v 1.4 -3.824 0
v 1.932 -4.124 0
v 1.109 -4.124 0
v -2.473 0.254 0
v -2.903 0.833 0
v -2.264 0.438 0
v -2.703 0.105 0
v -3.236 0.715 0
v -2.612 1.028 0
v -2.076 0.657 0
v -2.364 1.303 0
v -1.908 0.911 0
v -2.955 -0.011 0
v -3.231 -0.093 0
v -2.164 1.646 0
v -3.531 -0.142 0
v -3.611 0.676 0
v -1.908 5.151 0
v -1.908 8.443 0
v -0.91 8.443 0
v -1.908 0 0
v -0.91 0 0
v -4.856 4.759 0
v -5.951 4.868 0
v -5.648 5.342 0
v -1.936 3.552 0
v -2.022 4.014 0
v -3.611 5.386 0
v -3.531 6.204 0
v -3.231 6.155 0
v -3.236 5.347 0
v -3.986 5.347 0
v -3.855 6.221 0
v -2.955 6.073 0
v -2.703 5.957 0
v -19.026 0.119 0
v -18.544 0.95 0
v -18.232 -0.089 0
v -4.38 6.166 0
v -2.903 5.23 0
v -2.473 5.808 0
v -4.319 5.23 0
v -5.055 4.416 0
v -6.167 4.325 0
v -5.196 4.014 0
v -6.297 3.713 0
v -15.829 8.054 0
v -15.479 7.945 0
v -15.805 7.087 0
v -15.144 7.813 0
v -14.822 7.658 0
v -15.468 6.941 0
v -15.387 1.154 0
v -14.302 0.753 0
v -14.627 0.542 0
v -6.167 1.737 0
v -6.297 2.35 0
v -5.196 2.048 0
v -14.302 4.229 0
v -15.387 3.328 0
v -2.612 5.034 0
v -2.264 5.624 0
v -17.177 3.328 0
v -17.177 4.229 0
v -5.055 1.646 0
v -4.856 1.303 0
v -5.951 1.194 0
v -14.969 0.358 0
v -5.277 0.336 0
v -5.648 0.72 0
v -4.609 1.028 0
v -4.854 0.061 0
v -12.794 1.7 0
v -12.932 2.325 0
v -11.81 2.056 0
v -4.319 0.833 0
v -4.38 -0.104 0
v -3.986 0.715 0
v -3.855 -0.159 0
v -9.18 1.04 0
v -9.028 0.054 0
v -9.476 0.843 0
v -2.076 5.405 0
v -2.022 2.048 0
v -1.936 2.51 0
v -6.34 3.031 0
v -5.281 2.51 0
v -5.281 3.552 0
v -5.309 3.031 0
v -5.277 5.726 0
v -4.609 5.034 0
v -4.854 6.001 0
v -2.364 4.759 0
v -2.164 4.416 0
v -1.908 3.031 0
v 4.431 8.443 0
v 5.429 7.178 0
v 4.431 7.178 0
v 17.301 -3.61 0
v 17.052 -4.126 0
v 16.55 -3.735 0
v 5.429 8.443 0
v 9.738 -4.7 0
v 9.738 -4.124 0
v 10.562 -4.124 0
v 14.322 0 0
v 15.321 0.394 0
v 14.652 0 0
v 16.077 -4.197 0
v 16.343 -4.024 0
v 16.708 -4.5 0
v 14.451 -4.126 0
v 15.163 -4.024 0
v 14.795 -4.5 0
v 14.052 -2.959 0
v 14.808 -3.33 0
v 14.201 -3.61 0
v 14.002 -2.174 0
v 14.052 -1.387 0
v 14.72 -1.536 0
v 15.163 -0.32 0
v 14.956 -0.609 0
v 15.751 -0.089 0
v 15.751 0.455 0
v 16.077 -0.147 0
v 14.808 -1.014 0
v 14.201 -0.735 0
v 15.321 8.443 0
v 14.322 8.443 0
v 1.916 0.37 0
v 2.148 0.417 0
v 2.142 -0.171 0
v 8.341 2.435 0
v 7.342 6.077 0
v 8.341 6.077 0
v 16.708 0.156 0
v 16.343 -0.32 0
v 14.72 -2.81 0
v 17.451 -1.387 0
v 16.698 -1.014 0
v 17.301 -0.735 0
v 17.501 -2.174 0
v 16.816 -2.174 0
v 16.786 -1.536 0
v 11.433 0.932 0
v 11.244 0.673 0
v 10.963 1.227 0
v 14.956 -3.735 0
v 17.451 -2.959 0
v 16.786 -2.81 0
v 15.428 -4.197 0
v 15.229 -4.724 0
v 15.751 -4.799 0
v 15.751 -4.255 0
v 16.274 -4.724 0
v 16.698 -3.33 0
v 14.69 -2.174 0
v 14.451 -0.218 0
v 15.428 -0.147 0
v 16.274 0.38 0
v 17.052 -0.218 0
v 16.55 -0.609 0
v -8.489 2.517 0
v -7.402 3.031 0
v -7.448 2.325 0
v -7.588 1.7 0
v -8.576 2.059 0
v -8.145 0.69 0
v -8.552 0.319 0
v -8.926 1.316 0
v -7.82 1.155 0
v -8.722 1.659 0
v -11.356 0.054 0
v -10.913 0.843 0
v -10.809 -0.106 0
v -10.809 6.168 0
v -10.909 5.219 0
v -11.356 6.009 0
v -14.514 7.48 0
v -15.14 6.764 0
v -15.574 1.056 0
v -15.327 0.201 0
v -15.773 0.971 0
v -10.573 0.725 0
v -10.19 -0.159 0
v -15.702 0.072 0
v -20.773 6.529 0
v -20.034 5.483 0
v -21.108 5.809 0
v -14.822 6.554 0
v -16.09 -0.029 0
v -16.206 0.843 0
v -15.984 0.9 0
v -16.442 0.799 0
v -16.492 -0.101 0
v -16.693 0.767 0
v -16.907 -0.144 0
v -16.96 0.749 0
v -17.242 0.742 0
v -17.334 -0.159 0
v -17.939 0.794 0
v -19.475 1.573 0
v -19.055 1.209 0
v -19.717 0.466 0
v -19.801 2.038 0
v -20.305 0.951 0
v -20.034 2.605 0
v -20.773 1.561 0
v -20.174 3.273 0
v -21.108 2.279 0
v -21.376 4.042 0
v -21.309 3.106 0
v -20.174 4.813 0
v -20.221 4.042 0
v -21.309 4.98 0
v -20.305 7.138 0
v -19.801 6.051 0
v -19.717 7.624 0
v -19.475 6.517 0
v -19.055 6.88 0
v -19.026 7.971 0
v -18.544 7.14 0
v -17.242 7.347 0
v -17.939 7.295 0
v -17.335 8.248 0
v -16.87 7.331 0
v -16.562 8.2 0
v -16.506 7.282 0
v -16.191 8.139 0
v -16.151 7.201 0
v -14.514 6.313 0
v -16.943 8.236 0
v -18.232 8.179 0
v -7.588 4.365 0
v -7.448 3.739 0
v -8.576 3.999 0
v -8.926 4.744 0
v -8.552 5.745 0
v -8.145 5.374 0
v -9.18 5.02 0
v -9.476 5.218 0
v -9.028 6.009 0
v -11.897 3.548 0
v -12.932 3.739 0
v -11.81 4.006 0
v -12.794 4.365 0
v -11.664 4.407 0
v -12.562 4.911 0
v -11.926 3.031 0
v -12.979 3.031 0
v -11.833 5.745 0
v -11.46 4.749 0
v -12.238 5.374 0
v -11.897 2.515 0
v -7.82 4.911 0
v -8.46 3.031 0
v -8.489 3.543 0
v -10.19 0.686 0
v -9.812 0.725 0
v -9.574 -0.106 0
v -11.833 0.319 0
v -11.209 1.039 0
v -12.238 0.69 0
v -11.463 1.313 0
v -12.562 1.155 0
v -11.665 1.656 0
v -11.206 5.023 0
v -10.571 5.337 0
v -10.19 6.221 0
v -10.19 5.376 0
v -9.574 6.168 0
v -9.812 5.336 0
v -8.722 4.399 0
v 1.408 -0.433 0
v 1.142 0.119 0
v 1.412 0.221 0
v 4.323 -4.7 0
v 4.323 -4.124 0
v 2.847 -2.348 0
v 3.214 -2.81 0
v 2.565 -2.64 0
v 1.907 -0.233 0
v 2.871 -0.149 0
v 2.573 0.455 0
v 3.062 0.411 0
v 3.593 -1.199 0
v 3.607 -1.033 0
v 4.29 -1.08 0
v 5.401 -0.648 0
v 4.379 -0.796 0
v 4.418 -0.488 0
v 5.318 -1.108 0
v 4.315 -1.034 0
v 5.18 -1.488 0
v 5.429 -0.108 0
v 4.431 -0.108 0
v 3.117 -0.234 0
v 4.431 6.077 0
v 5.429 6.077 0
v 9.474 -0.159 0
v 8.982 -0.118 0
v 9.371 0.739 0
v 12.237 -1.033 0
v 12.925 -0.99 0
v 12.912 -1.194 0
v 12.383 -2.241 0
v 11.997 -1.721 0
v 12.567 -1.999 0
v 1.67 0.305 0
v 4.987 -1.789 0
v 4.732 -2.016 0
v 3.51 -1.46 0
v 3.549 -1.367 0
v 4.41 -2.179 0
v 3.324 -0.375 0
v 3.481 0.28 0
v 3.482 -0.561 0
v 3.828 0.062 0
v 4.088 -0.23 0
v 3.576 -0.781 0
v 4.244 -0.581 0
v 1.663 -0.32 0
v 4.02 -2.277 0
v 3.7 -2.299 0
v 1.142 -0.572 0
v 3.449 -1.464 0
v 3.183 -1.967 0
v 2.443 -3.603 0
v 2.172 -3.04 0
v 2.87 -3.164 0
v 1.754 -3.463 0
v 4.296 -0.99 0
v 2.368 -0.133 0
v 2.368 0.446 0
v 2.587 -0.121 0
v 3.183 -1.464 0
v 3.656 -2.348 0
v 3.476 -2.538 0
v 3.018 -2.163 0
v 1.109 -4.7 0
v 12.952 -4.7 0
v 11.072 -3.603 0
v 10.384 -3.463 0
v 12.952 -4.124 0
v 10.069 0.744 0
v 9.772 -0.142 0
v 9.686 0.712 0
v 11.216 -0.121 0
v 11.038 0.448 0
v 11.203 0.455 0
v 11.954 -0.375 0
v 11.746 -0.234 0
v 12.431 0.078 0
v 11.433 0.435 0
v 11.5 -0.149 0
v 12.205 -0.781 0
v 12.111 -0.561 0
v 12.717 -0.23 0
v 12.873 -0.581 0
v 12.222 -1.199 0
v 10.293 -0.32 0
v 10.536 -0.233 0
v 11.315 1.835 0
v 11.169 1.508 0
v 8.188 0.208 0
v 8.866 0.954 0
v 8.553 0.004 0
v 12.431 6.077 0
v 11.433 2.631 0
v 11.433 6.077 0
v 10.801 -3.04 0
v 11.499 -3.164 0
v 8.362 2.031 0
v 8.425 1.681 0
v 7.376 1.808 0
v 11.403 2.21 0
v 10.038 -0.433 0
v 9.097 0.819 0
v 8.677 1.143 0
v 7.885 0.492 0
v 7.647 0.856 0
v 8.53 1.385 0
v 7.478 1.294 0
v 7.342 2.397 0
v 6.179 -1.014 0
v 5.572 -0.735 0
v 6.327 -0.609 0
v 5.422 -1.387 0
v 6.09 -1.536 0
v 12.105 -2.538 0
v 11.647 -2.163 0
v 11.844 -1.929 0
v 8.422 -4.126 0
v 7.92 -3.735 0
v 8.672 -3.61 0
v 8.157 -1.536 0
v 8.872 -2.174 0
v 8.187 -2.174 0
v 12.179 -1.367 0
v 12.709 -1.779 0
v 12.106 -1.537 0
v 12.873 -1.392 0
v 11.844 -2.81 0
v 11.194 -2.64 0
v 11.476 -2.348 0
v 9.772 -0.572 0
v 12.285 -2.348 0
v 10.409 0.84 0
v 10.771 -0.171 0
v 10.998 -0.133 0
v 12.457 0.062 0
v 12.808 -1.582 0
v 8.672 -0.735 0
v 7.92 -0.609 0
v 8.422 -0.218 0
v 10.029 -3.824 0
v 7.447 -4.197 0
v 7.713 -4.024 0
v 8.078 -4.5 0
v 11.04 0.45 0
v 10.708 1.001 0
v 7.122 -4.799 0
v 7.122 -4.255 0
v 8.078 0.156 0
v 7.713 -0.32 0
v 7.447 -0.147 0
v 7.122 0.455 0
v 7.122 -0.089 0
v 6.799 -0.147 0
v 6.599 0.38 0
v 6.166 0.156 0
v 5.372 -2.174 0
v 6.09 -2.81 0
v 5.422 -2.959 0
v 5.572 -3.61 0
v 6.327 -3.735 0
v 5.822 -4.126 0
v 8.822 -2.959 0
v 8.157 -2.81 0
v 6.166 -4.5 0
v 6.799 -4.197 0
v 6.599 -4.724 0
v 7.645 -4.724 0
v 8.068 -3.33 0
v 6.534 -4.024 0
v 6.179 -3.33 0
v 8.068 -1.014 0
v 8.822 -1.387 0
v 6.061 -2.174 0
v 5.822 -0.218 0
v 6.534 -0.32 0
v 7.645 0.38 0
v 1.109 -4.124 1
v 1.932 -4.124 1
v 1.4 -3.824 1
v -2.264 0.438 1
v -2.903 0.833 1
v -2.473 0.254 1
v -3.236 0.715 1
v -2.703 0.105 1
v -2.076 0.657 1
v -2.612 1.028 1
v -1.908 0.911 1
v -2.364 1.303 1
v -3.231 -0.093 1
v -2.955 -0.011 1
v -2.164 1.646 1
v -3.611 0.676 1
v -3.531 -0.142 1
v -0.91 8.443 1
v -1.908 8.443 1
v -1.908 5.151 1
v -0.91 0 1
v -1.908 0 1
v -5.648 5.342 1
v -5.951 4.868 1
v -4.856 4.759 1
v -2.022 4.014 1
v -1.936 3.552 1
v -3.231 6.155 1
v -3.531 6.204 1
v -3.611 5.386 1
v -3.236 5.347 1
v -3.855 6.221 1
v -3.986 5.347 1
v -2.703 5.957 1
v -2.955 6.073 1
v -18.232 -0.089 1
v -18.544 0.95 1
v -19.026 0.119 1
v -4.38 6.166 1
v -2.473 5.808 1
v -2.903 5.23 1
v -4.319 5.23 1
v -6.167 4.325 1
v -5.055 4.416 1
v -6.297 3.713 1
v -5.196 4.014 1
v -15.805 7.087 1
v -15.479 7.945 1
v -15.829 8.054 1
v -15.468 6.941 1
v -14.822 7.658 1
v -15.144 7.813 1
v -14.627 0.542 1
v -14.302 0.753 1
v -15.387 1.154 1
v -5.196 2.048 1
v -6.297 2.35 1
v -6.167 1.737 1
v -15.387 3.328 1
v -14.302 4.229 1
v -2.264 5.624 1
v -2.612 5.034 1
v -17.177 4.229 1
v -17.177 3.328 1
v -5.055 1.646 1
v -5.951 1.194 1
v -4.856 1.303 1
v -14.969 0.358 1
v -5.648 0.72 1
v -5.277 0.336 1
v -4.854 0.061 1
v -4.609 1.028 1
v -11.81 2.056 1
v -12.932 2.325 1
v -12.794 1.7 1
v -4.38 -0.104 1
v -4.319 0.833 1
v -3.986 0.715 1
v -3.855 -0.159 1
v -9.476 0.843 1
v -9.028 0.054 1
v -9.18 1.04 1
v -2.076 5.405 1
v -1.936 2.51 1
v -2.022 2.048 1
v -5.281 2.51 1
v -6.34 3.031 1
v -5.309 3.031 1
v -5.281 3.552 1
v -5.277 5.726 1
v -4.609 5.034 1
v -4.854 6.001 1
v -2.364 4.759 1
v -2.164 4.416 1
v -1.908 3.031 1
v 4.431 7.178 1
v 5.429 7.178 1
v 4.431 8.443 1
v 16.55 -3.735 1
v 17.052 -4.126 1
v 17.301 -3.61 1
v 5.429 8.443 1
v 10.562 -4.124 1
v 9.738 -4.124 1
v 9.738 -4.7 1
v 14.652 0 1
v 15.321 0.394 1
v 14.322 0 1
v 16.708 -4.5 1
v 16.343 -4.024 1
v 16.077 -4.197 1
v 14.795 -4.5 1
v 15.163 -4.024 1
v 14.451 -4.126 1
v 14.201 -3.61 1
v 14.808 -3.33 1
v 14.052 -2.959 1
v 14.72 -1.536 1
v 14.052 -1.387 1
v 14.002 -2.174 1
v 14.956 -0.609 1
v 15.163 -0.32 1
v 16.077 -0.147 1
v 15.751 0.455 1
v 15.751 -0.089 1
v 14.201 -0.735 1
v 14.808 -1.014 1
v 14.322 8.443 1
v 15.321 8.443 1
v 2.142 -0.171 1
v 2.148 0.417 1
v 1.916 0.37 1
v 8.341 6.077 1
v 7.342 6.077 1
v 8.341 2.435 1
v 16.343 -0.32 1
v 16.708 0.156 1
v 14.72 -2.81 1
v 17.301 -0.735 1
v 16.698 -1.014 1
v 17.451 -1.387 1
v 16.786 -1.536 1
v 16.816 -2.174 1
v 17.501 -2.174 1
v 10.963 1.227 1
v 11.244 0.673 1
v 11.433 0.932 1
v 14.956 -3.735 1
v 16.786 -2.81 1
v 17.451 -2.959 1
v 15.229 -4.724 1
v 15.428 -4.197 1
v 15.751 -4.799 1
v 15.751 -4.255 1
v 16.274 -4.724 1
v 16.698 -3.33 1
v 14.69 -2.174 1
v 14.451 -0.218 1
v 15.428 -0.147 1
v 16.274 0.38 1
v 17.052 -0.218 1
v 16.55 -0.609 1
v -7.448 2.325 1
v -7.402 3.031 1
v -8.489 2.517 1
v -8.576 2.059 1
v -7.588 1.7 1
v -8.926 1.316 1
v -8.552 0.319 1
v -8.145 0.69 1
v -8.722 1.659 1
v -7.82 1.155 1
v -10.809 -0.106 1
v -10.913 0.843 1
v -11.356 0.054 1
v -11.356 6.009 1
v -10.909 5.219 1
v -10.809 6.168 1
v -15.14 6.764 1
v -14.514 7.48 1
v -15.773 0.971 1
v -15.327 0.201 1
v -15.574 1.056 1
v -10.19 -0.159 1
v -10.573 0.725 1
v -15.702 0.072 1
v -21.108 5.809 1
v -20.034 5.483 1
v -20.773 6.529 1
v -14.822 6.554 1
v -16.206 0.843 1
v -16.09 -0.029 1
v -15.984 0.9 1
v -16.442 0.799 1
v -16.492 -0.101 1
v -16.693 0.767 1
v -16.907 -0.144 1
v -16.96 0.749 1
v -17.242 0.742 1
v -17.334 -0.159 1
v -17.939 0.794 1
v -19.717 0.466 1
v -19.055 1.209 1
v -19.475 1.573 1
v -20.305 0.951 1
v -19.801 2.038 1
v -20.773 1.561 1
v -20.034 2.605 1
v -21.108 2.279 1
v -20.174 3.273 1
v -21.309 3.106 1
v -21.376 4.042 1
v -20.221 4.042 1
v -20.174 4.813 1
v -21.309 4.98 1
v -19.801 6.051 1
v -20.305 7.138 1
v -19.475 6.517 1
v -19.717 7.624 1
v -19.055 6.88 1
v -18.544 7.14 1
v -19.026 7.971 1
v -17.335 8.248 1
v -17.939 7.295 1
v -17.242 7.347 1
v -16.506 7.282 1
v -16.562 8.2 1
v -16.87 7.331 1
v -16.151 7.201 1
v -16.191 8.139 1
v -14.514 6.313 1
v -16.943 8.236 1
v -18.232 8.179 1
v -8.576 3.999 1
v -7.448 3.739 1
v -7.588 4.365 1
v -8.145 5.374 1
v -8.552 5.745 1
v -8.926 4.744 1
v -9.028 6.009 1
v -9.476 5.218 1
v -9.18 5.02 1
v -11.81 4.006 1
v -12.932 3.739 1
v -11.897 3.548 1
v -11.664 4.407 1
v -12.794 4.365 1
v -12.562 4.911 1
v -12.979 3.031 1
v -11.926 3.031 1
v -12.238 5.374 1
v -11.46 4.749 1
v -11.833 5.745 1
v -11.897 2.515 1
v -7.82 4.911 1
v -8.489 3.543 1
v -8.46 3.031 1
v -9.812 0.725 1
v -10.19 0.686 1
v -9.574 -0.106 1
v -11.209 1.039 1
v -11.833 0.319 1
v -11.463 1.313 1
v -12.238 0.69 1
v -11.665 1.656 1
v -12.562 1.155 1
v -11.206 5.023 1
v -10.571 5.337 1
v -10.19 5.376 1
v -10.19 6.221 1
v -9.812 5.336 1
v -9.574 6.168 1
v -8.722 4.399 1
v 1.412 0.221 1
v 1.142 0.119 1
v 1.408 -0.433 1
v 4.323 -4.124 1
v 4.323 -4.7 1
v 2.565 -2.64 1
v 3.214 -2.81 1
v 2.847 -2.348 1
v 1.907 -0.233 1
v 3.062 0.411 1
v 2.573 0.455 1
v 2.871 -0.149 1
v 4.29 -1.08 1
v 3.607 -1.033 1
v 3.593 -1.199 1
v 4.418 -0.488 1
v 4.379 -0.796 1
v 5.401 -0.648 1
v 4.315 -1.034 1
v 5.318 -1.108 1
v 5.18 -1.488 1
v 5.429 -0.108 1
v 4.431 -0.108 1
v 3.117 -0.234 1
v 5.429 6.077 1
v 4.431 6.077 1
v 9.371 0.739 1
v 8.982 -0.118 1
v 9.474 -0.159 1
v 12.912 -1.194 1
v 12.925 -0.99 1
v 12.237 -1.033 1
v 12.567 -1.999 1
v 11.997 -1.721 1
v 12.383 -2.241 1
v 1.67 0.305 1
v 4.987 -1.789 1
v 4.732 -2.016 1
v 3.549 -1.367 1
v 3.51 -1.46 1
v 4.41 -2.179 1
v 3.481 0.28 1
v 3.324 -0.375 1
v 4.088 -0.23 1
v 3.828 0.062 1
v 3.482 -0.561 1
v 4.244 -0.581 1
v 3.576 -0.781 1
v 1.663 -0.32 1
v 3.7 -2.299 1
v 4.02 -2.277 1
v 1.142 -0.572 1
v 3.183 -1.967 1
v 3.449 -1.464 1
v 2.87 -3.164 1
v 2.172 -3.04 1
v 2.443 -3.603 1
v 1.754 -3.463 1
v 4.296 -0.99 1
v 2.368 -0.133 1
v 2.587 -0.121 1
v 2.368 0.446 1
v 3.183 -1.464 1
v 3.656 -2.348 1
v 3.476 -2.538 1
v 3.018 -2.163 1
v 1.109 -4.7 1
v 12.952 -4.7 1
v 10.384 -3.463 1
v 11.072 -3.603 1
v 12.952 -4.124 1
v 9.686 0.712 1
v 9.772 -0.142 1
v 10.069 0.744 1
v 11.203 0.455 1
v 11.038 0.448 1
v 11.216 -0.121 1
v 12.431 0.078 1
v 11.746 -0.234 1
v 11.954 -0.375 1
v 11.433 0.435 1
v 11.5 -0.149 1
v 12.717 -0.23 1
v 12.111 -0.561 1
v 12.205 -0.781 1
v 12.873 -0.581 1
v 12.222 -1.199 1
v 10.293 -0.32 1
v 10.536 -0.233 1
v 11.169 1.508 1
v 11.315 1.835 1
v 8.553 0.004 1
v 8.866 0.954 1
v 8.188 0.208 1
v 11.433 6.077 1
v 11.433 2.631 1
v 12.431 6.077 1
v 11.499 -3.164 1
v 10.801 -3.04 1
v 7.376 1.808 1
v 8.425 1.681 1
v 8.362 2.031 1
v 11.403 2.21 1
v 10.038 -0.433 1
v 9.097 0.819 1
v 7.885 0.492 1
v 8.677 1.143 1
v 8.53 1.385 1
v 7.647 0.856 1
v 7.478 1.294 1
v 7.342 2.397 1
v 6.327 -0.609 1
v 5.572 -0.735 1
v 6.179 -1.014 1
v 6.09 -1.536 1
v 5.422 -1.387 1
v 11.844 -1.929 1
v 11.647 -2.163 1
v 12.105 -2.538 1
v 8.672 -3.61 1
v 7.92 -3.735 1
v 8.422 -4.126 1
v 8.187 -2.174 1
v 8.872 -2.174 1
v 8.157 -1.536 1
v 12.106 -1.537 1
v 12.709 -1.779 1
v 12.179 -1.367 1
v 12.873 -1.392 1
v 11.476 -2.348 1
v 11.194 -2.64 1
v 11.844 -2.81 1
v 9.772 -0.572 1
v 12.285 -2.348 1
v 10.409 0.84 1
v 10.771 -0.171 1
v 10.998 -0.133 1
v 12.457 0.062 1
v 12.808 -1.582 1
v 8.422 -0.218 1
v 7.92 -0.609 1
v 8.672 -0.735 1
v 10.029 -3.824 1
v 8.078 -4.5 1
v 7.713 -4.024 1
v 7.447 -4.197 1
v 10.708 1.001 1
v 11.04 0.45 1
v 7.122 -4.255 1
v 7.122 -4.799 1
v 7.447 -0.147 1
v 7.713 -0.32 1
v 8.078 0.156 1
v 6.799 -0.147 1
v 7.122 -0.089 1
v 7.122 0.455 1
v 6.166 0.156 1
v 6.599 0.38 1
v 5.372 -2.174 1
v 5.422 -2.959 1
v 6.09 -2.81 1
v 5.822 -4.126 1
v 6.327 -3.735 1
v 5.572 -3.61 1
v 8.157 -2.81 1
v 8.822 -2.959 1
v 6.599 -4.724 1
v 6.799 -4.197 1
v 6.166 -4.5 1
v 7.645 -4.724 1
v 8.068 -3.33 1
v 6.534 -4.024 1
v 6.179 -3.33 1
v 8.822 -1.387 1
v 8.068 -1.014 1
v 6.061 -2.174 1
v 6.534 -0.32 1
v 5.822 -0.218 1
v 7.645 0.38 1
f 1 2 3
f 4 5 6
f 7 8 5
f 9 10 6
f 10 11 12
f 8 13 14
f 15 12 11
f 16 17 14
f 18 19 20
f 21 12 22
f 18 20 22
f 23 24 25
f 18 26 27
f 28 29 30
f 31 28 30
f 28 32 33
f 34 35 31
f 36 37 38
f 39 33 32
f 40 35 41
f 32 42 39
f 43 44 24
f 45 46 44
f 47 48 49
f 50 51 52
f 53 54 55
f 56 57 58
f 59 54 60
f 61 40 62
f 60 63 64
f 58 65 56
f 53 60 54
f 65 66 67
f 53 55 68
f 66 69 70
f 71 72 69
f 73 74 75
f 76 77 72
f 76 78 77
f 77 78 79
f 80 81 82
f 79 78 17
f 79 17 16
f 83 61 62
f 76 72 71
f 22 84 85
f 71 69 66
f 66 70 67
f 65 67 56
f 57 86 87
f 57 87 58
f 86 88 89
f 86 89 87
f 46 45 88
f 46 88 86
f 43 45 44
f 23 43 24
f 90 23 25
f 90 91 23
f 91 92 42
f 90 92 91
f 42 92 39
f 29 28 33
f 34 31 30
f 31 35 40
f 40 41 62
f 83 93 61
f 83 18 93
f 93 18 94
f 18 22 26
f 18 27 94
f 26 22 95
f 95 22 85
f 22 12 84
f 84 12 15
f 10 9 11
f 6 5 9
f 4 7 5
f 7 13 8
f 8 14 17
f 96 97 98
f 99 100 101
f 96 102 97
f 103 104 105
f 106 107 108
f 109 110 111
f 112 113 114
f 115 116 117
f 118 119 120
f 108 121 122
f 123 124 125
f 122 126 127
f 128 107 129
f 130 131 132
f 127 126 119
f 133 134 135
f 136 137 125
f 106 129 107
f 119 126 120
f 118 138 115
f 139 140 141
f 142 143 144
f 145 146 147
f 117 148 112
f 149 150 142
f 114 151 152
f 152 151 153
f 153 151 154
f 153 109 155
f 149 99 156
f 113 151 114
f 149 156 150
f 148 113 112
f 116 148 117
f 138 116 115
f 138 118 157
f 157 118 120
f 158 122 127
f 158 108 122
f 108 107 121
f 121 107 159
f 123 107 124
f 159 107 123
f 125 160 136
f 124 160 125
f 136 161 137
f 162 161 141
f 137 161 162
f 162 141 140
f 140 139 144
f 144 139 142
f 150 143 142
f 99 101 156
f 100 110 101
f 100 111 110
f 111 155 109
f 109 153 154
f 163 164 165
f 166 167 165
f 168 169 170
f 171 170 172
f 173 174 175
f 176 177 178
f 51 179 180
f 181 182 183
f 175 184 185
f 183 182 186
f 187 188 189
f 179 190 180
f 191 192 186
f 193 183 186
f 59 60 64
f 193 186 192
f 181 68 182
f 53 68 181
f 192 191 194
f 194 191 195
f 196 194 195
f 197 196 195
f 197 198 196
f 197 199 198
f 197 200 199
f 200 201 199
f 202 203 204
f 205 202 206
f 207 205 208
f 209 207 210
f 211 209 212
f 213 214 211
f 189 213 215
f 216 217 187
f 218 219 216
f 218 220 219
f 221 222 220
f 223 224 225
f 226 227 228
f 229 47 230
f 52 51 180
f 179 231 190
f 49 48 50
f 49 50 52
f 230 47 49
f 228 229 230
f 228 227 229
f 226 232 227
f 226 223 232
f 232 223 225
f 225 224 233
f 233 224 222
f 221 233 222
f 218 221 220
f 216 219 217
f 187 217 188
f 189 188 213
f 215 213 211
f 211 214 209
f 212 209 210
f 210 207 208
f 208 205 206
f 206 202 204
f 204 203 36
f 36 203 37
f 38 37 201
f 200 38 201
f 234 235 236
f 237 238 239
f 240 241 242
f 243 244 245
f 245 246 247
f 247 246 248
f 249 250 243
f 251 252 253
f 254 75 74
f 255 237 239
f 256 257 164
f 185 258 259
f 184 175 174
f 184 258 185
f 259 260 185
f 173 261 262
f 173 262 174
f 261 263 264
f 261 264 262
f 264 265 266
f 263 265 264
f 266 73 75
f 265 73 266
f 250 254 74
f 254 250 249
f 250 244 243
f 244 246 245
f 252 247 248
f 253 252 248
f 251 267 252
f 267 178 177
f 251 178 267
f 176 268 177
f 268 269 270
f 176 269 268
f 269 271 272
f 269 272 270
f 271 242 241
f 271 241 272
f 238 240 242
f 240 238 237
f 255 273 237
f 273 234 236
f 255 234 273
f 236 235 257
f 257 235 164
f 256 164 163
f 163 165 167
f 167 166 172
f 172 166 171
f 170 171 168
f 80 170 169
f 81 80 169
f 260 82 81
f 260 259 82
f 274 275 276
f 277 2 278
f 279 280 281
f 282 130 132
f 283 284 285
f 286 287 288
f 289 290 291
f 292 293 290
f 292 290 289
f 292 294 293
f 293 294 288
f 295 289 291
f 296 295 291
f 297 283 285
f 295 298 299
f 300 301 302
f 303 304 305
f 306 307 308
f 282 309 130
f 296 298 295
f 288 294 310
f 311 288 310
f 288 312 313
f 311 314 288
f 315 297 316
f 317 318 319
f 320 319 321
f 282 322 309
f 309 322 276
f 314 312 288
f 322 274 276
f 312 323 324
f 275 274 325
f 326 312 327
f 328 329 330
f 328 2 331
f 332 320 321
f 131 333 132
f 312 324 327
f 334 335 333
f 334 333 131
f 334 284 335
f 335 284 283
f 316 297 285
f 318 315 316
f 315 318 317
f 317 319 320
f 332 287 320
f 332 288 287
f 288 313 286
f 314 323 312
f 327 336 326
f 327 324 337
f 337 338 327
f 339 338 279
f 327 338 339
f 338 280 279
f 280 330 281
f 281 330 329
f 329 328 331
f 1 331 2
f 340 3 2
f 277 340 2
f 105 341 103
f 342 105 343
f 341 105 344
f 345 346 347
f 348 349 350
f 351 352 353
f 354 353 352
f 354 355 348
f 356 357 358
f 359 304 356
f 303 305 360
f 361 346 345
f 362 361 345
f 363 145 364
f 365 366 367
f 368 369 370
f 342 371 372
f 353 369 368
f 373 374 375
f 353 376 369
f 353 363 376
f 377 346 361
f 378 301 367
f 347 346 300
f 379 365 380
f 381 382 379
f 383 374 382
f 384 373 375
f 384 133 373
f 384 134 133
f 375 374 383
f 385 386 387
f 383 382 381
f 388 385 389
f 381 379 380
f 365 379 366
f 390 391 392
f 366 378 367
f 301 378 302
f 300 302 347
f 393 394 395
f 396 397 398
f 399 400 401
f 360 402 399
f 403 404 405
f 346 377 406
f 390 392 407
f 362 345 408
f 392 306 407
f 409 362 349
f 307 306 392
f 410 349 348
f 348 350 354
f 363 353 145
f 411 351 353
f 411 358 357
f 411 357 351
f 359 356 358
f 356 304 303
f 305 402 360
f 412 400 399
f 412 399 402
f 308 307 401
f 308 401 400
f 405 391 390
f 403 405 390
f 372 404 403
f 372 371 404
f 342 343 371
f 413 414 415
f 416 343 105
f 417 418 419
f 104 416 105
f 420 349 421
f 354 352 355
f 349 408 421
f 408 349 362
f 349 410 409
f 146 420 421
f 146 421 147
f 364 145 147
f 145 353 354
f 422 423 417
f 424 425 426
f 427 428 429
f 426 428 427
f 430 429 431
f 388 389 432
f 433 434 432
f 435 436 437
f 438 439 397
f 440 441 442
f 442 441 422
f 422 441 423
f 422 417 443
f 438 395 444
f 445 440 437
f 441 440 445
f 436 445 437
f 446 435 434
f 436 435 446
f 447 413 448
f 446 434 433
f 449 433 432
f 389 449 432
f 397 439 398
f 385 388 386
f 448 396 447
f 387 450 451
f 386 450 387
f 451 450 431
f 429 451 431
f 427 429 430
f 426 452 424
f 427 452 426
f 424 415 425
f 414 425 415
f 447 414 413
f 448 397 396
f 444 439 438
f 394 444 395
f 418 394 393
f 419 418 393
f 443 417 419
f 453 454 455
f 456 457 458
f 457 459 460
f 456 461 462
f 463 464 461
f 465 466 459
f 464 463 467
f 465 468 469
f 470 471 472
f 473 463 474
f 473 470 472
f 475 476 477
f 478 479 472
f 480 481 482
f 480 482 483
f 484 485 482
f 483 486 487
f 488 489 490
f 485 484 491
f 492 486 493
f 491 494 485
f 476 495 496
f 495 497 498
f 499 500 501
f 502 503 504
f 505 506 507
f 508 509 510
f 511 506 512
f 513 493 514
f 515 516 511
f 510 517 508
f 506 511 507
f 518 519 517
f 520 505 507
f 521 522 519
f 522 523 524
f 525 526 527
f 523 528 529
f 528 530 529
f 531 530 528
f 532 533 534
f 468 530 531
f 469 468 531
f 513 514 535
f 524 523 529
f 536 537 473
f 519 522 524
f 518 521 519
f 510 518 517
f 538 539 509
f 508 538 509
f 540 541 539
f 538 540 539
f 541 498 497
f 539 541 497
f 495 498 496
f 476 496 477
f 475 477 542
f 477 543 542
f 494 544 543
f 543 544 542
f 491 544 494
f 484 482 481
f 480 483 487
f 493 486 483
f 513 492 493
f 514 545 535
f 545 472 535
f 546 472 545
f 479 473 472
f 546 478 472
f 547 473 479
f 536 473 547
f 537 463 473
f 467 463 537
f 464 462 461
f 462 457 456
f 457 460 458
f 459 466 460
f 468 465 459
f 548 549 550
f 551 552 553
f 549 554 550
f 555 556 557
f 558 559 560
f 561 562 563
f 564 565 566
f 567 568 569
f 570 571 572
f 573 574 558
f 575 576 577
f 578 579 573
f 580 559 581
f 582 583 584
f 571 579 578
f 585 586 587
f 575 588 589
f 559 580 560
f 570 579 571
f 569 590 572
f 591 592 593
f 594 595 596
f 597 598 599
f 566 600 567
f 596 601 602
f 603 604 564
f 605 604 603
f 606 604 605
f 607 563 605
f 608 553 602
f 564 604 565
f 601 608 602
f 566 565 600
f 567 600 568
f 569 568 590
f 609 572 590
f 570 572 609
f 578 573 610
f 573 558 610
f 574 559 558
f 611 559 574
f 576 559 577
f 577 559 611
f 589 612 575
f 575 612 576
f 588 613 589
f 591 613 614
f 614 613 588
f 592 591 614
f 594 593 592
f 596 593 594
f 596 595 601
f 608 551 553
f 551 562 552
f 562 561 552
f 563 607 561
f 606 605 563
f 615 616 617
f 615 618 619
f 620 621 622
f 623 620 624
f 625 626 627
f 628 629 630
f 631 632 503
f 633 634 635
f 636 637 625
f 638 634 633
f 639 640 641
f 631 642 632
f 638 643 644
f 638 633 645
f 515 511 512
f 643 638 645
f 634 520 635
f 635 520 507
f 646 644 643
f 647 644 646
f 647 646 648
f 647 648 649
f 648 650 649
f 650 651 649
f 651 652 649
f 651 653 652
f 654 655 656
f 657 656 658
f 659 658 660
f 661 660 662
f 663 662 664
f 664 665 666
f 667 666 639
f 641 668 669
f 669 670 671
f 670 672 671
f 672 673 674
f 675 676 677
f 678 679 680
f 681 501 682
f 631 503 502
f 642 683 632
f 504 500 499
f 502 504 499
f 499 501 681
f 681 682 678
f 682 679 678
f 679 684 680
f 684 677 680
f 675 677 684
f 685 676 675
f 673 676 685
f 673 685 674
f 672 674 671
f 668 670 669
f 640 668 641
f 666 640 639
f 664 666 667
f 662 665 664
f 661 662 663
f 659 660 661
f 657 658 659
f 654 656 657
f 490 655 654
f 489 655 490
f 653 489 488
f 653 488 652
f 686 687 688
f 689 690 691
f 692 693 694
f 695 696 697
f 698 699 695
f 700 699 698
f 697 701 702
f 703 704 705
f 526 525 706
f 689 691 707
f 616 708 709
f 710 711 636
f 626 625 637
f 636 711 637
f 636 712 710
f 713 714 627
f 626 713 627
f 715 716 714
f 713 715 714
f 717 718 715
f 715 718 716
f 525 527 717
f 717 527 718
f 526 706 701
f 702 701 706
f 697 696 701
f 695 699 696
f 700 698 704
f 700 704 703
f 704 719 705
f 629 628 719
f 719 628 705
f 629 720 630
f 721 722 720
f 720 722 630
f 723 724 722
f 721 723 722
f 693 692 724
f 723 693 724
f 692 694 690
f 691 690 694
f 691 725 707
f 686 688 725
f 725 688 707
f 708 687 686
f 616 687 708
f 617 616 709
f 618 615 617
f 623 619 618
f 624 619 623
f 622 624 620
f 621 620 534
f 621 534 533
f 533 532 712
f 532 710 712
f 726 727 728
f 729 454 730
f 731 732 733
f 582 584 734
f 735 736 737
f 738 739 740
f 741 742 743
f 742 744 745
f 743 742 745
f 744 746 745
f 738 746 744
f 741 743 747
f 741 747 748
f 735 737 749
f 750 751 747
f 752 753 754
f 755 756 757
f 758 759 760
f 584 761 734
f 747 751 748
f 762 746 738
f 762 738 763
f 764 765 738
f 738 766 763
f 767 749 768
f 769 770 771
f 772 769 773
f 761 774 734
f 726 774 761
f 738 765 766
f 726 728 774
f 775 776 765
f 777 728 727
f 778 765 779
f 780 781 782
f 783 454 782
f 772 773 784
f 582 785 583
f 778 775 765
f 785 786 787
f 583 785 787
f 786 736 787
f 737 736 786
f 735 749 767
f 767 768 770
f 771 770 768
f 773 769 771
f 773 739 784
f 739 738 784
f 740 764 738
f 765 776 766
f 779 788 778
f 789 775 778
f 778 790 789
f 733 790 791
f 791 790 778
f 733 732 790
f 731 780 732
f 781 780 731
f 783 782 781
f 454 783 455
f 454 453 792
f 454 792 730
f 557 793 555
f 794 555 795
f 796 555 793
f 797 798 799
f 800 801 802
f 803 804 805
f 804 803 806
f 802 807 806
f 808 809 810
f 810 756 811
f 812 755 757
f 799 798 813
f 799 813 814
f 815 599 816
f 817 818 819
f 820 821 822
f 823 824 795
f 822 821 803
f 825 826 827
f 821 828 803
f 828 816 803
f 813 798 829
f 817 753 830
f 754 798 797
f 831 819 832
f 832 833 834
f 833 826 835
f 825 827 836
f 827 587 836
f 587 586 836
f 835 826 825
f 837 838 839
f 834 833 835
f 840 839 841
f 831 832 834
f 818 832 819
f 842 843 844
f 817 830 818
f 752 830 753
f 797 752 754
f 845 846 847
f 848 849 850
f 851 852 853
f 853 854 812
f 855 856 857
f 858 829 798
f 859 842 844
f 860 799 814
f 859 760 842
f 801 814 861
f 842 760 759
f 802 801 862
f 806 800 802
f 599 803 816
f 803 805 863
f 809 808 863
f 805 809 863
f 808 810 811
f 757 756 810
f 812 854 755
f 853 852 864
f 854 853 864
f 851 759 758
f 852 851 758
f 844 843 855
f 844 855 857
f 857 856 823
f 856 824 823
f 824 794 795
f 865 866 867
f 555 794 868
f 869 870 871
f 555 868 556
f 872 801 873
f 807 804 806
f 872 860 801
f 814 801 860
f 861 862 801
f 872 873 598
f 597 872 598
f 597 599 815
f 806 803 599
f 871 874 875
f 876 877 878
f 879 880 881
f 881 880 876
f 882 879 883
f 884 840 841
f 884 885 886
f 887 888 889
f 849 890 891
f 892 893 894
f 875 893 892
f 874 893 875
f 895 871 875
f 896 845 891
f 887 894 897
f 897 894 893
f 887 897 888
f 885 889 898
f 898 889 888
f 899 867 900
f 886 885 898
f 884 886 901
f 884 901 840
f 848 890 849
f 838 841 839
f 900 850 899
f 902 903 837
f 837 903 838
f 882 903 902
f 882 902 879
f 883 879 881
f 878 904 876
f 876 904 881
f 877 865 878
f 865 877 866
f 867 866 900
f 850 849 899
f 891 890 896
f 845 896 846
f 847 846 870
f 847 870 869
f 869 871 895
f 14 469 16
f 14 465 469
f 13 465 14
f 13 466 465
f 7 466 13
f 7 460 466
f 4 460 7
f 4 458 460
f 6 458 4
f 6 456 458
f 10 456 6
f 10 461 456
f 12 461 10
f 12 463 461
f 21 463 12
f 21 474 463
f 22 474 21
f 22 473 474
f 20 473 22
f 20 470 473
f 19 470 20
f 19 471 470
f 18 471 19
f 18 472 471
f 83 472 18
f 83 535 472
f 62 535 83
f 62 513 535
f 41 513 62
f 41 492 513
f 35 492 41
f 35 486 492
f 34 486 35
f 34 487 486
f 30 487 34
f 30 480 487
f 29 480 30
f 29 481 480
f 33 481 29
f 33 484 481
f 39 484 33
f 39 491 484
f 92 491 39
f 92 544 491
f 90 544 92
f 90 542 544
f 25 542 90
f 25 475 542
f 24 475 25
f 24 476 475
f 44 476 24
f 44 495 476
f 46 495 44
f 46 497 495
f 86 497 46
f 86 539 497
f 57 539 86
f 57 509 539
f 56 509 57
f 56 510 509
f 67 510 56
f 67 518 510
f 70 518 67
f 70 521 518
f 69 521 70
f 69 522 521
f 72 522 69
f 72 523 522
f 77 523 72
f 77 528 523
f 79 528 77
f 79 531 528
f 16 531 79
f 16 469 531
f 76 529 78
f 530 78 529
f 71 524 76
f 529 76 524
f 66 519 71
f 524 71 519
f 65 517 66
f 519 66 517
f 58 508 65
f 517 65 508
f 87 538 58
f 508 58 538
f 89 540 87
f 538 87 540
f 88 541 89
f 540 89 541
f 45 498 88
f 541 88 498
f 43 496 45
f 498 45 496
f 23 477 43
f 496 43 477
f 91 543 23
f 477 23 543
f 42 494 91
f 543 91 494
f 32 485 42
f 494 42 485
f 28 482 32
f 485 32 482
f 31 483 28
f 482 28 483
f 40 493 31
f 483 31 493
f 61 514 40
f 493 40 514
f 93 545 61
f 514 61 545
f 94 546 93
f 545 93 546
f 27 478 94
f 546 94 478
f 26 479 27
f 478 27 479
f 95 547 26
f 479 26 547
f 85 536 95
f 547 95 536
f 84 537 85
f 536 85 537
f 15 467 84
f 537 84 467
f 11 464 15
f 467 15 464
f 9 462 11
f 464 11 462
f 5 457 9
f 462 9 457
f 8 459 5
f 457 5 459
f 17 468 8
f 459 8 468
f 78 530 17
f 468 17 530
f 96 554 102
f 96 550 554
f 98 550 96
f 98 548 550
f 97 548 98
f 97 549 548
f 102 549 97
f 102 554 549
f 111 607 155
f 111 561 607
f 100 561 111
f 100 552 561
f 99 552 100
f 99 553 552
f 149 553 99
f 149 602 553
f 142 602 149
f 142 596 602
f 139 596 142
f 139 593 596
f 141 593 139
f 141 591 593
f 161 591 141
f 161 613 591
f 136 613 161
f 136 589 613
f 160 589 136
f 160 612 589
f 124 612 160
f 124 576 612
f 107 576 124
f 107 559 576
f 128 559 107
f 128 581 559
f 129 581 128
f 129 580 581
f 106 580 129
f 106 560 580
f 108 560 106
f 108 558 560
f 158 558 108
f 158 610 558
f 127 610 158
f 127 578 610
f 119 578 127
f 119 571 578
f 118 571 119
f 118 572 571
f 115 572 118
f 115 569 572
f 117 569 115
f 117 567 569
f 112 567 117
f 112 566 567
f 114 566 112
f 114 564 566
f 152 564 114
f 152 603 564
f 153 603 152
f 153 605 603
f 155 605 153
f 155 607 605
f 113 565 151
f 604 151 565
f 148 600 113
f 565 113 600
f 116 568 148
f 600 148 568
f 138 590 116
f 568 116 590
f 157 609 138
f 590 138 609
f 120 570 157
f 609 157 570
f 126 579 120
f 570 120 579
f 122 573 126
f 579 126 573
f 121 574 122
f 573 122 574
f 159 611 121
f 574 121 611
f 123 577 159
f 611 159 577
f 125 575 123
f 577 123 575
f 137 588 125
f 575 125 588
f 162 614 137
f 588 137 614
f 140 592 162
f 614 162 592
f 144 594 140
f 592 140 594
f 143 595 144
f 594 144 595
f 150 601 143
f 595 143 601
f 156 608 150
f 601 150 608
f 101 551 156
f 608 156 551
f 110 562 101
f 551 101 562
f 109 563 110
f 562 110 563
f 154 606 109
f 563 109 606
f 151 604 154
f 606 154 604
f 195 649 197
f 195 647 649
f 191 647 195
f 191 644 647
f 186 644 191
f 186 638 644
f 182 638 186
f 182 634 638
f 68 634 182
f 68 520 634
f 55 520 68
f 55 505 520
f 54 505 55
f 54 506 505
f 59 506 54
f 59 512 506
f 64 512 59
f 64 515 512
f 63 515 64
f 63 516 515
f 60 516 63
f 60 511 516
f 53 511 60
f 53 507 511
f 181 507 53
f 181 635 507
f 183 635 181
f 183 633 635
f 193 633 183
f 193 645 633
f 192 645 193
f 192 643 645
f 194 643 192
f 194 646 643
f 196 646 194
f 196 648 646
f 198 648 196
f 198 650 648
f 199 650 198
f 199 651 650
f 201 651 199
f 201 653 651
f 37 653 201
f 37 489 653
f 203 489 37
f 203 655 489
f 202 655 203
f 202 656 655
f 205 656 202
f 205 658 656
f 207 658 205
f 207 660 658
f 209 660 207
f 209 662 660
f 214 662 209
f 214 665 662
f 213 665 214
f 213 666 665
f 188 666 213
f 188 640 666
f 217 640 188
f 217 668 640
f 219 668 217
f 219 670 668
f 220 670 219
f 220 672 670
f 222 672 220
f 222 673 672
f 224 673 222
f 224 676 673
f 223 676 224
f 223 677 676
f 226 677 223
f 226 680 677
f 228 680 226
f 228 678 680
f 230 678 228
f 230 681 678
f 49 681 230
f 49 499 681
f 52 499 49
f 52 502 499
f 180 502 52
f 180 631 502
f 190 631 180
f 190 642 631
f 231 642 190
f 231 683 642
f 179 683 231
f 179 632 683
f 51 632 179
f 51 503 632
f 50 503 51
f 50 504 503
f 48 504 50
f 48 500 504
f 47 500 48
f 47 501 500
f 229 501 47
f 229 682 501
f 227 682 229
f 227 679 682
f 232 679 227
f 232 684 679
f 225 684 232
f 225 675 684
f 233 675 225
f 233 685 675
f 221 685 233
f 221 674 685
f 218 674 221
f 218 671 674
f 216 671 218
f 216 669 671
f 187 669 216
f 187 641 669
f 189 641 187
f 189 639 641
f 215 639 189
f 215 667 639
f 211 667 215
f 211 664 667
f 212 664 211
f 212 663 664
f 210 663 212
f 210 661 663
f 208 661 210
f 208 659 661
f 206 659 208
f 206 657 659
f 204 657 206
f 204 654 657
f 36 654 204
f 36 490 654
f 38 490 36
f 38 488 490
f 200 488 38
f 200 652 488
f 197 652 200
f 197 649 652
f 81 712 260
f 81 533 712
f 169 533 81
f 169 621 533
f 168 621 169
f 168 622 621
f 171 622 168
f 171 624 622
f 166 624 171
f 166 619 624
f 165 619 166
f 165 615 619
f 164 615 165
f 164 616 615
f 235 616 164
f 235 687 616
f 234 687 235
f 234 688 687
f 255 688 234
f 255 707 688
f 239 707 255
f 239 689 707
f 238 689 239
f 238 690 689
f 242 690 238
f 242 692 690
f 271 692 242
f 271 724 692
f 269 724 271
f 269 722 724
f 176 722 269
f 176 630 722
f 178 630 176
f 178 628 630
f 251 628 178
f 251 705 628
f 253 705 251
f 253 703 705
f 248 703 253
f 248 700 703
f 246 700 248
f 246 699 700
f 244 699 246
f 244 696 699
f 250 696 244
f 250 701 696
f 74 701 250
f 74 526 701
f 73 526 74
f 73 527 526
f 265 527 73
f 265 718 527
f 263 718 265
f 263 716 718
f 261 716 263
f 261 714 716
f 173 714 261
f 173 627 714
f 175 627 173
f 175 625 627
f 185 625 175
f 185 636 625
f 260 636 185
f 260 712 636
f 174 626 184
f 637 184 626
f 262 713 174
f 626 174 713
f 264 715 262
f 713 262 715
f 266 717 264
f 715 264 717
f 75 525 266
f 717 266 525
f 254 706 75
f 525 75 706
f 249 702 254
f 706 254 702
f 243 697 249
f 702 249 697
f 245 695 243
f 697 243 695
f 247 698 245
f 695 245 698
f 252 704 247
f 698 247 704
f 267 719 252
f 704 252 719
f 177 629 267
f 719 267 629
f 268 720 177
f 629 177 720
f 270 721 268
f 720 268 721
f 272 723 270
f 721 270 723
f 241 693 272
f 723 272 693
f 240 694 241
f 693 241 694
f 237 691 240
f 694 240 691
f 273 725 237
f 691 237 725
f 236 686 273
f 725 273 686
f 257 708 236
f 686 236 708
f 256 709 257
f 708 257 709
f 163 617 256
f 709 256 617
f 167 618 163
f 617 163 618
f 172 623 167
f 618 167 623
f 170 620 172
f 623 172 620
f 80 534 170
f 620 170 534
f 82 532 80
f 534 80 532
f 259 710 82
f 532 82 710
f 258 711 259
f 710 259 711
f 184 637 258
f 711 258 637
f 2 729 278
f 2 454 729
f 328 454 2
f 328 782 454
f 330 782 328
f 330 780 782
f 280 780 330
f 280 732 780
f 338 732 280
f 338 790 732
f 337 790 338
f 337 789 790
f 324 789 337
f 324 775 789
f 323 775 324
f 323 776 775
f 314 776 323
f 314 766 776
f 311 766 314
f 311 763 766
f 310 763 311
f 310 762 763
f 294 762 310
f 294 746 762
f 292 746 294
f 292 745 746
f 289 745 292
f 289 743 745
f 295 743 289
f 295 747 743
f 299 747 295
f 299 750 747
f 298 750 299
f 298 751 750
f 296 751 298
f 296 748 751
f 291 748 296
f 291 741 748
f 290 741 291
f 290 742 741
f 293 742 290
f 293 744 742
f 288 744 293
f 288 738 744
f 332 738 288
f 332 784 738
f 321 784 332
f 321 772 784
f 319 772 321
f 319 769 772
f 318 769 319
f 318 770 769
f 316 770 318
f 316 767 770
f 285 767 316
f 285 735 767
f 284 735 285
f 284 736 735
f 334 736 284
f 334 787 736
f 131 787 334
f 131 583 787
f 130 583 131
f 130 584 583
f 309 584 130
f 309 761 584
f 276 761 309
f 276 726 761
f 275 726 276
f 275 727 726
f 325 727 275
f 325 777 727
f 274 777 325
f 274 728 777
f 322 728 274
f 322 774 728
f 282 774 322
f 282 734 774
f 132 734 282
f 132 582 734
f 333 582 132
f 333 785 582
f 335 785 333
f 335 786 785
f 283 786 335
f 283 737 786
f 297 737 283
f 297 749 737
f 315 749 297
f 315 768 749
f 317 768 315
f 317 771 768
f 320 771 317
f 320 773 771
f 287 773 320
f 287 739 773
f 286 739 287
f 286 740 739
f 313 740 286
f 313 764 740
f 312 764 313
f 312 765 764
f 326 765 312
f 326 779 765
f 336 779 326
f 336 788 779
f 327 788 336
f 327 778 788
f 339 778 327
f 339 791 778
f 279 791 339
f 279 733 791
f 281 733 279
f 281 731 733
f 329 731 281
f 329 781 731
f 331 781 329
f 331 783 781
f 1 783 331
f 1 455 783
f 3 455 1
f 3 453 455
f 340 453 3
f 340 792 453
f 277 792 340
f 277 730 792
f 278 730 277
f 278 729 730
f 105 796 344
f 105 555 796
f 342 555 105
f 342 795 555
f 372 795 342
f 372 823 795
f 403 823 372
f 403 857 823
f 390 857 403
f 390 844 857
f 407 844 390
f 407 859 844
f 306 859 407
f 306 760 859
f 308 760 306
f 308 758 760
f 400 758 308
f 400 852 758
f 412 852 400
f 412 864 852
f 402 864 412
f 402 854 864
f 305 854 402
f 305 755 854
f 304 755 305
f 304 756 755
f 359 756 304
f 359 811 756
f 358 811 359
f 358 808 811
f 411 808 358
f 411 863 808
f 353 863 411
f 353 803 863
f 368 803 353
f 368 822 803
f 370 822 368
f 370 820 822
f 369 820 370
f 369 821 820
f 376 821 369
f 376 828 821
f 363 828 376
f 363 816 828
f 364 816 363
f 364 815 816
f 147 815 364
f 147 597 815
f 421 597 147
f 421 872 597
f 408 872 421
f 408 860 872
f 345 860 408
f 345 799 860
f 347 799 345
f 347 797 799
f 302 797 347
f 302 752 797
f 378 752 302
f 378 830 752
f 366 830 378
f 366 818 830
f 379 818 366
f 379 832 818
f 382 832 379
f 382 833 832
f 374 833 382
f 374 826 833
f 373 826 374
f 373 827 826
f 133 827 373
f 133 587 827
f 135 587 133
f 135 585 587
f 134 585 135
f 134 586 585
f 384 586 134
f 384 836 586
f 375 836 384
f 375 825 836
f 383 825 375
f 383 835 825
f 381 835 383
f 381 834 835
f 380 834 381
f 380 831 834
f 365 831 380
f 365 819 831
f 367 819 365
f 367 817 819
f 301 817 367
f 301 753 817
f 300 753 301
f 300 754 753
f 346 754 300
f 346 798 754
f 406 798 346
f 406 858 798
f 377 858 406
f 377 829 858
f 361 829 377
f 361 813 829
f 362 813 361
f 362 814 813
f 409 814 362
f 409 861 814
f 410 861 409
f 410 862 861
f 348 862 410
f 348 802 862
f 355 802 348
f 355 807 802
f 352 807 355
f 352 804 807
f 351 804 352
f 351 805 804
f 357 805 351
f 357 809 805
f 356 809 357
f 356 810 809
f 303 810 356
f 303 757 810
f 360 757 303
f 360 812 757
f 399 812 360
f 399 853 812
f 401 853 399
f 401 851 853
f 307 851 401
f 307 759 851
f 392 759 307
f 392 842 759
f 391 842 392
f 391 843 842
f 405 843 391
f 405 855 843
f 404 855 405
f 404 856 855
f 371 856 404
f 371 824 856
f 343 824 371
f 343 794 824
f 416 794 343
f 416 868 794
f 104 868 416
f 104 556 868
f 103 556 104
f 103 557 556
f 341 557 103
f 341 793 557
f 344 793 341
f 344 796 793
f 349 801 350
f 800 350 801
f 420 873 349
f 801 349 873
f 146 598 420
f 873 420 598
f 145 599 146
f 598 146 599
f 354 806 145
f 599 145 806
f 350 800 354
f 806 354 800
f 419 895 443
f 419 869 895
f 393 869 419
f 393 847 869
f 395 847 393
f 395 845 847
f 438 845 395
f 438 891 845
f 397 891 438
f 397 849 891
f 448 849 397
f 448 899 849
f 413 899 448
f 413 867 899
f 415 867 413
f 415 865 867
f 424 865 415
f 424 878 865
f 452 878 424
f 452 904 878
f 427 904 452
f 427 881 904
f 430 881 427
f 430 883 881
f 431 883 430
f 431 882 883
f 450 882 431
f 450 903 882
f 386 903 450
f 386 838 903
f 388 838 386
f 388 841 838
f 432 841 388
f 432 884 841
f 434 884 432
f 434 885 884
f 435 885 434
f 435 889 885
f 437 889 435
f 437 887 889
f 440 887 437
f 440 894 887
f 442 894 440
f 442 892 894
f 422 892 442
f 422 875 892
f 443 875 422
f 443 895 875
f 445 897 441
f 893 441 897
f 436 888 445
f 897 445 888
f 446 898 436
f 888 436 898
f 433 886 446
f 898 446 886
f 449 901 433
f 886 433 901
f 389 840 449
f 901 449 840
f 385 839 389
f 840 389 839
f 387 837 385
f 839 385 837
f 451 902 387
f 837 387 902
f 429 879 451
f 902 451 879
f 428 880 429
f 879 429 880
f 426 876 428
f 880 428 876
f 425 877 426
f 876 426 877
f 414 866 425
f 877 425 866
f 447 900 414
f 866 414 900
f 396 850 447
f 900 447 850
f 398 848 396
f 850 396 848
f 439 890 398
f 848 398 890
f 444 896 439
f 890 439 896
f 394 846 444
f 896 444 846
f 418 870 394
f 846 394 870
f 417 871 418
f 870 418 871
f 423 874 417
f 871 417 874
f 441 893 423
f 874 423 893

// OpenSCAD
fontface="Apple Chancery";
//fontface="Savoye LET";
//fontface="Zapfino";
fontsize=8;

linear_extrude(1) {
    translate([-22,0]) {
        text("God jul", font=fontface, size=fontsize);
        translate([22.6,-4.7])
            text("2020", font=fontface, size=fontsize-3);
    }
}
